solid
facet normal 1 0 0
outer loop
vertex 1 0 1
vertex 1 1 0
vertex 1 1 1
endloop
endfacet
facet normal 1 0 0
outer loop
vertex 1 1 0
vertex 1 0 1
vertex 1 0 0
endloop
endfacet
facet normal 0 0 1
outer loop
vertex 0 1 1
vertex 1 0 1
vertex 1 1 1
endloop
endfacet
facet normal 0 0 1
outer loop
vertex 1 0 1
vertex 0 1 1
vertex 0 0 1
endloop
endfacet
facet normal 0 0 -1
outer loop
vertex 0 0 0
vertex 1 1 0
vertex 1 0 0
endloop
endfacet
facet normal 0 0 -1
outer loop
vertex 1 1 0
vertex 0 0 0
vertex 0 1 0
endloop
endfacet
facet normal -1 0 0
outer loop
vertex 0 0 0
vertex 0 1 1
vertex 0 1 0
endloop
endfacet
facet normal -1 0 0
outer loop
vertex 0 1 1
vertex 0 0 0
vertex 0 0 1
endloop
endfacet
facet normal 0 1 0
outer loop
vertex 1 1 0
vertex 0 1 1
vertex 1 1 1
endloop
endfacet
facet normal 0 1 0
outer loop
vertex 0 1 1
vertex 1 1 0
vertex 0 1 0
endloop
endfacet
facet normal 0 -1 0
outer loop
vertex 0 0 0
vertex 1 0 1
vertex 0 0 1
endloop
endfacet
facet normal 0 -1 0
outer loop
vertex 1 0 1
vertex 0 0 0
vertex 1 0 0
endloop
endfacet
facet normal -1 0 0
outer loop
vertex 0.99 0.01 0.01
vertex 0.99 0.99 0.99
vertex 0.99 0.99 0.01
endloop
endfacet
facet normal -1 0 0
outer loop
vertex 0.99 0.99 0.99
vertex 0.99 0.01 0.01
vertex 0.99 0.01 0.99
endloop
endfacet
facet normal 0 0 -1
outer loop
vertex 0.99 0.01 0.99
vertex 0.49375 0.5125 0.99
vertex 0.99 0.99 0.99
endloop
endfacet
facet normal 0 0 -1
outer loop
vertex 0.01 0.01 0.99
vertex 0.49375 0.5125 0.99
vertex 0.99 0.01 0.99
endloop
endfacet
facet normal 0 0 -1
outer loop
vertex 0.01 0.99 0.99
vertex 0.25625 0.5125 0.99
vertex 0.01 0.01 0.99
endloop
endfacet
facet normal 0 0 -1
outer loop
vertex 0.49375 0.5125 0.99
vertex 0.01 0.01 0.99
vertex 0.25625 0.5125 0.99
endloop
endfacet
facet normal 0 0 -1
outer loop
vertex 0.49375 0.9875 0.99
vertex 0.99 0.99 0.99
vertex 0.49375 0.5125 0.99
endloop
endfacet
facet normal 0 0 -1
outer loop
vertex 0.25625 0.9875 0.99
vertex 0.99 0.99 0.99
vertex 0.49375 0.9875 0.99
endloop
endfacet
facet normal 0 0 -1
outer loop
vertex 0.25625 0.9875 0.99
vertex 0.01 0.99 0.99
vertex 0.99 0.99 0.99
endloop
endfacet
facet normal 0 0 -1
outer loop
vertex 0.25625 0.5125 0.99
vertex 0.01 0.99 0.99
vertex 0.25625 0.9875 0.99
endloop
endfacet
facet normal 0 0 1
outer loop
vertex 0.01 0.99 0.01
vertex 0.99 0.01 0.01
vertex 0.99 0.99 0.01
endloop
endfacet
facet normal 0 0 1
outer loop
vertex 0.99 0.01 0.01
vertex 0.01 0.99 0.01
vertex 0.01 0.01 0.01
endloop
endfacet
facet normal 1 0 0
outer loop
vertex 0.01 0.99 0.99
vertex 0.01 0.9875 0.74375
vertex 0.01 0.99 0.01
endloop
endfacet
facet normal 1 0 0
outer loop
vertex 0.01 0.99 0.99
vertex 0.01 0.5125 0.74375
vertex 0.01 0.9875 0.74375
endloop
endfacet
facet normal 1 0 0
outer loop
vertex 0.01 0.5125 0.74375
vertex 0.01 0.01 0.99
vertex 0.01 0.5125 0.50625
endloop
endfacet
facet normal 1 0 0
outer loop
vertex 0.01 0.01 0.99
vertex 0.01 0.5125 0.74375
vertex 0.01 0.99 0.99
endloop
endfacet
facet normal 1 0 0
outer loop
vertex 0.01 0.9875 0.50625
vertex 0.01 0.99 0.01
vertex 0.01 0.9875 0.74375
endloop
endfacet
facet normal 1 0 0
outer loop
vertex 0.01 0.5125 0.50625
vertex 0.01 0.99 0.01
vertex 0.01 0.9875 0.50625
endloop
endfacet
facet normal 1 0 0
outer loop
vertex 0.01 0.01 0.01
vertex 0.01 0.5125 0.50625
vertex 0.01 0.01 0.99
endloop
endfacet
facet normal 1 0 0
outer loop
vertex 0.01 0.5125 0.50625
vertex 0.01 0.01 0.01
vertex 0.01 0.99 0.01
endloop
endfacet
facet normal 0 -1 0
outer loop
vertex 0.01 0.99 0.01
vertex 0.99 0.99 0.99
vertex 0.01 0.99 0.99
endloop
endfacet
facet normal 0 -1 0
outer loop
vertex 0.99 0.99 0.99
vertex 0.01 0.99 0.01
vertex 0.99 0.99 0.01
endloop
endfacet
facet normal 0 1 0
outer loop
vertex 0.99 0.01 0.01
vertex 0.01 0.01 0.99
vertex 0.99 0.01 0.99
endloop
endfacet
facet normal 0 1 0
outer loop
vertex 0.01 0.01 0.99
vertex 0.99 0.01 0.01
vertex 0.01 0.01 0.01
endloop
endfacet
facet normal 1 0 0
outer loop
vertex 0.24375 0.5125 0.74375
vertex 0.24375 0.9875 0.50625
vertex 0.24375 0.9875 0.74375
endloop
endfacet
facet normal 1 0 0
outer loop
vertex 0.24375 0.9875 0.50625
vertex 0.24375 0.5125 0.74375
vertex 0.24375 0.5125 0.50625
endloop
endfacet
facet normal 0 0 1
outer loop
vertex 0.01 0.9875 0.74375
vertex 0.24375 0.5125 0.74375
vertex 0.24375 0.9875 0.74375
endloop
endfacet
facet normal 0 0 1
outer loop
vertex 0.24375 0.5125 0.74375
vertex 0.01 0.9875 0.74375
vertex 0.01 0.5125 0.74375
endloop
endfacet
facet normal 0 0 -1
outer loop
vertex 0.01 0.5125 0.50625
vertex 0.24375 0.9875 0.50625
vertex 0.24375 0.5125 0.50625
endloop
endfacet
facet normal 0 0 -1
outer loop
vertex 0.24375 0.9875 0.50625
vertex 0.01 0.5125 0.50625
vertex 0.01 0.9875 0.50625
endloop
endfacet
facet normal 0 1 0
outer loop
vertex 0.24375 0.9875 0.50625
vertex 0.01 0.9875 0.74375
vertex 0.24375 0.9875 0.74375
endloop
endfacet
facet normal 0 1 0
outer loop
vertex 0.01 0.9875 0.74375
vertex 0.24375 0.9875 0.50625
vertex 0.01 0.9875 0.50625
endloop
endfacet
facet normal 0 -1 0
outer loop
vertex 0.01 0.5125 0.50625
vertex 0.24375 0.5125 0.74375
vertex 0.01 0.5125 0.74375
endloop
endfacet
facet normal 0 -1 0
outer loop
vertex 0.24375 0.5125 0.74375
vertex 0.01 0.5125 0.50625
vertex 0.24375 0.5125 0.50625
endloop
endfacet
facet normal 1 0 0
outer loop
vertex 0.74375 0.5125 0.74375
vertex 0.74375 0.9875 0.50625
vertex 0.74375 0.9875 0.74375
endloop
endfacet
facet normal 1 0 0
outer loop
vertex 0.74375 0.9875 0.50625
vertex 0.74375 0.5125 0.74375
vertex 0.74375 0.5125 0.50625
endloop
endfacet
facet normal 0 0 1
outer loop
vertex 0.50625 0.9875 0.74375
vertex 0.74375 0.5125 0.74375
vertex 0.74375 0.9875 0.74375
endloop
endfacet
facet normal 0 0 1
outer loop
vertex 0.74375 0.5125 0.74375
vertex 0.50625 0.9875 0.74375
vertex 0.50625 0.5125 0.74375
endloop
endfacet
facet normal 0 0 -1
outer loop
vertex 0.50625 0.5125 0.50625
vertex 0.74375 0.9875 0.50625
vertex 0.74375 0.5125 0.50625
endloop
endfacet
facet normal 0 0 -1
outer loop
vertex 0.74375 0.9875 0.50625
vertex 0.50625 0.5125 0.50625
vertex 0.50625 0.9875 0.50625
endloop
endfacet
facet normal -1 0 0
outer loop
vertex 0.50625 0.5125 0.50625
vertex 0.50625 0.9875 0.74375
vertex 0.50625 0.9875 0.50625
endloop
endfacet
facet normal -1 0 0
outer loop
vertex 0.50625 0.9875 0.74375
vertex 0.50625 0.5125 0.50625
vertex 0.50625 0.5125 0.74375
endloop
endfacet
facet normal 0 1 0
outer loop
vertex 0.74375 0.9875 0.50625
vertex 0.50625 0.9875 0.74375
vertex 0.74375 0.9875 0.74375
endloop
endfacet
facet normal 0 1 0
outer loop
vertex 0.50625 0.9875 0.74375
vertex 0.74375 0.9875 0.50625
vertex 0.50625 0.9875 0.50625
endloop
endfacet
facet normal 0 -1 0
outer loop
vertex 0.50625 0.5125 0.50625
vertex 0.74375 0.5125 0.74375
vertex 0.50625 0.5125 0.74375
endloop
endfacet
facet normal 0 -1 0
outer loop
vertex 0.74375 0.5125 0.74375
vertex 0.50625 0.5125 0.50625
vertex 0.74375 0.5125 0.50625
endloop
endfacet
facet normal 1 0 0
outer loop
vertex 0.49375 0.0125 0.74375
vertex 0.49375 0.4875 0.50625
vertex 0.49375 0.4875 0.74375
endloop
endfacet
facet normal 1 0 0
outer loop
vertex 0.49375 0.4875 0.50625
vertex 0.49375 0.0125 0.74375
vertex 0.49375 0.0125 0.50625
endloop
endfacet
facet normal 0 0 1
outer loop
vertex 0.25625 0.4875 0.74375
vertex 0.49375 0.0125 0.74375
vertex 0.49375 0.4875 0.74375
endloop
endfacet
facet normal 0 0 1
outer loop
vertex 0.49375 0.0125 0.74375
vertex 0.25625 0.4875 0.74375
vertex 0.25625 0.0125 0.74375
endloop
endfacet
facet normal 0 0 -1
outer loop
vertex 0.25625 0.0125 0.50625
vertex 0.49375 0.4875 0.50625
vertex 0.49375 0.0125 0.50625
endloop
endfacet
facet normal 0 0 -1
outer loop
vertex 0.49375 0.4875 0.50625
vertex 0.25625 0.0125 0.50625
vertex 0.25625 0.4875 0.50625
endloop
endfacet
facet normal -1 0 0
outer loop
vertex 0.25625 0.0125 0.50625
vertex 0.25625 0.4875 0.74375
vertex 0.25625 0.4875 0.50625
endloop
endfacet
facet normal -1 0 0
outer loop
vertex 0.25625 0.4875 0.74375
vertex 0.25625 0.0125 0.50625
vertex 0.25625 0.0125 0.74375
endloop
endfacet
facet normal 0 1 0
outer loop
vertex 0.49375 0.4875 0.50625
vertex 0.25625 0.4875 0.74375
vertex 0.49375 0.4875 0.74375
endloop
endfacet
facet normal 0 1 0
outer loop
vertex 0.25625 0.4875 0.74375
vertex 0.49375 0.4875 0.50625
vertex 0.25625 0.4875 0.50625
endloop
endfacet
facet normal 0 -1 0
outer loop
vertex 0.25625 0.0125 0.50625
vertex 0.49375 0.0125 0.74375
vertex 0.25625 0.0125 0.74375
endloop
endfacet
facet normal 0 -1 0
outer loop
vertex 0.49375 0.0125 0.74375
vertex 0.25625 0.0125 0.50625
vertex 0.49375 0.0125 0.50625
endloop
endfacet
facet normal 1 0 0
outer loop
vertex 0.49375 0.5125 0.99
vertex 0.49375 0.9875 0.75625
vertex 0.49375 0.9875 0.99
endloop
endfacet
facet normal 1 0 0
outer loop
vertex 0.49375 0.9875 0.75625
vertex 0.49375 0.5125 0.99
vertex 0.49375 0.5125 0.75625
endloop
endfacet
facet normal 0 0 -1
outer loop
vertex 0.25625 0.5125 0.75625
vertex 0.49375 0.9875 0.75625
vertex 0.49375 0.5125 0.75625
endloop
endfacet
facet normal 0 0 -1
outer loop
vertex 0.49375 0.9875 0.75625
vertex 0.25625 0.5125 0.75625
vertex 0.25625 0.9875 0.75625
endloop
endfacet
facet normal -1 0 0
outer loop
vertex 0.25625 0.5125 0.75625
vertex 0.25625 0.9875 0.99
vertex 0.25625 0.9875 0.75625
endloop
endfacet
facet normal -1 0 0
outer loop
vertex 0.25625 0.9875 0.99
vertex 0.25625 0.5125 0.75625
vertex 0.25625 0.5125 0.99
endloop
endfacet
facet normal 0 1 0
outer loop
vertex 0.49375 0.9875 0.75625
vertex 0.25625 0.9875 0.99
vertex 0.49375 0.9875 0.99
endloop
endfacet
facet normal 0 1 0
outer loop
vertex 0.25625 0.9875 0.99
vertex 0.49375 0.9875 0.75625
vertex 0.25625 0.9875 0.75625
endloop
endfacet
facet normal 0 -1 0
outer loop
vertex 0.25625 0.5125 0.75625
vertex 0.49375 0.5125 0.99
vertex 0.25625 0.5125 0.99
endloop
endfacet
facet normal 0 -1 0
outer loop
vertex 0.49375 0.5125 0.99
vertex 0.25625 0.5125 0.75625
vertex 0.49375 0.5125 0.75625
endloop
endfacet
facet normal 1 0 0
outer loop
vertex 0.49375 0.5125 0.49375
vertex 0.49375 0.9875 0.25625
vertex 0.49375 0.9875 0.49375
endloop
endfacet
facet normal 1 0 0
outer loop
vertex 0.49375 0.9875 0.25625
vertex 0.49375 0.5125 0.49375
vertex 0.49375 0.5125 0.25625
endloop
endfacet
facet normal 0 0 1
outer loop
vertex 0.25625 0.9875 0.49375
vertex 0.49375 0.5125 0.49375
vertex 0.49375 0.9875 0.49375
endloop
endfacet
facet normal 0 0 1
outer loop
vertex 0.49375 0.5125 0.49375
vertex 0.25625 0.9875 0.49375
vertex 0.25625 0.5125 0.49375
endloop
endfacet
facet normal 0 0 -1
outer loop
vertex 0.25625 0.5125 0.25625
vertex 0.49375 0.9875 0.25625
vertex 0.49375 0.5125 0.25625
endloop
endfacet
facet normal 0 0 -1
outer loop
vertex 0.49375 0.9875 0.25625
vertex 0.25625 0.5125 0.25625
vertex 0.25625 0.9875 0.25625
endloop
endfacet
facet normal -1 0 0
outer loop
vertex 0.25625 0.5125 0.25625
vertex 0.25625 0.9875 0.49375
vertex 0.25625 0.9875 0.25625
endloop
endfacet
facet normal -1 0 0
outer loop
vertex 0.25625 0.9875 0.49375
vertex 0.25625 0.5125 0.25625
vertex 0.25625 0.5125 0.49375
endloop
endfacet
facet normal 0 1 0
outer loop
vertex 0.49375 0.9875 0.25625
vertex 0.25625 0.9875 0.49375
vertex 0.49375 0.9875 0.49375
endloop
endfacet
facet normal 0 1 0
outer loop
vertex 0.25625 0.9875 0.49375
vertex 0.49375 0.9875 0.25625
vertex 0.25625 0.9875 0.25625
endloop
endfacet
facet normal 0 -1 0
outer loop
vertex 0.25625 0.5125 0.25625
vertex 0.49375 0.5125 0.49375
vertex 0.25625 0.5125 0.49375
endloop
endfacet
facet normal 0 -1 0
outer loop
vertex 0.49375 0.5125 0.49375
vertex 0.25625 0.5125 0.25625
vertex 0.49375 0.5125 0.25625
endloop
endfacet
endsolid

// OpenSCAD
translate([0.125, 0.75, 0.625]) color([0.06494400601239902, 0.1370326903583805, 0.49733203542127835]) cube([0.2375, 0.475, 0.2375], center=true);
translate([0.625, 0.75, 0.625]) color([0.5518374011491438, 0.8621239616211223, 0.7640605587038841]) cube([0.2375, 0.475, 0.2375], center=true);
translate([0.375, 0.25, 0.625]) color([0.8291560023411321, 0.8339329260836371, 0.2900132233262862]) cube([0.2375, 0.475, 0.2375], center=true);
translate([0.375, 0.75, 0.875]) color([0.1235573438467612, 0.7821073219175587, 0.2853850719705827]) cube([0.2375, 0.475, 0.2375], center=true);
translate([0.375, 0.75, 0.375]) color([0.982230253998938, 0.8639500596928916, 0.02635167674832528]) cube([0.2375, 0.475, 0.2375], center=true);
color([0.3,0.3,0.3,0.3]) difference() { cube([1,1,1]); translate([0.01,0.01,0.01]) cube([0.98,0.98,0.98]); }
